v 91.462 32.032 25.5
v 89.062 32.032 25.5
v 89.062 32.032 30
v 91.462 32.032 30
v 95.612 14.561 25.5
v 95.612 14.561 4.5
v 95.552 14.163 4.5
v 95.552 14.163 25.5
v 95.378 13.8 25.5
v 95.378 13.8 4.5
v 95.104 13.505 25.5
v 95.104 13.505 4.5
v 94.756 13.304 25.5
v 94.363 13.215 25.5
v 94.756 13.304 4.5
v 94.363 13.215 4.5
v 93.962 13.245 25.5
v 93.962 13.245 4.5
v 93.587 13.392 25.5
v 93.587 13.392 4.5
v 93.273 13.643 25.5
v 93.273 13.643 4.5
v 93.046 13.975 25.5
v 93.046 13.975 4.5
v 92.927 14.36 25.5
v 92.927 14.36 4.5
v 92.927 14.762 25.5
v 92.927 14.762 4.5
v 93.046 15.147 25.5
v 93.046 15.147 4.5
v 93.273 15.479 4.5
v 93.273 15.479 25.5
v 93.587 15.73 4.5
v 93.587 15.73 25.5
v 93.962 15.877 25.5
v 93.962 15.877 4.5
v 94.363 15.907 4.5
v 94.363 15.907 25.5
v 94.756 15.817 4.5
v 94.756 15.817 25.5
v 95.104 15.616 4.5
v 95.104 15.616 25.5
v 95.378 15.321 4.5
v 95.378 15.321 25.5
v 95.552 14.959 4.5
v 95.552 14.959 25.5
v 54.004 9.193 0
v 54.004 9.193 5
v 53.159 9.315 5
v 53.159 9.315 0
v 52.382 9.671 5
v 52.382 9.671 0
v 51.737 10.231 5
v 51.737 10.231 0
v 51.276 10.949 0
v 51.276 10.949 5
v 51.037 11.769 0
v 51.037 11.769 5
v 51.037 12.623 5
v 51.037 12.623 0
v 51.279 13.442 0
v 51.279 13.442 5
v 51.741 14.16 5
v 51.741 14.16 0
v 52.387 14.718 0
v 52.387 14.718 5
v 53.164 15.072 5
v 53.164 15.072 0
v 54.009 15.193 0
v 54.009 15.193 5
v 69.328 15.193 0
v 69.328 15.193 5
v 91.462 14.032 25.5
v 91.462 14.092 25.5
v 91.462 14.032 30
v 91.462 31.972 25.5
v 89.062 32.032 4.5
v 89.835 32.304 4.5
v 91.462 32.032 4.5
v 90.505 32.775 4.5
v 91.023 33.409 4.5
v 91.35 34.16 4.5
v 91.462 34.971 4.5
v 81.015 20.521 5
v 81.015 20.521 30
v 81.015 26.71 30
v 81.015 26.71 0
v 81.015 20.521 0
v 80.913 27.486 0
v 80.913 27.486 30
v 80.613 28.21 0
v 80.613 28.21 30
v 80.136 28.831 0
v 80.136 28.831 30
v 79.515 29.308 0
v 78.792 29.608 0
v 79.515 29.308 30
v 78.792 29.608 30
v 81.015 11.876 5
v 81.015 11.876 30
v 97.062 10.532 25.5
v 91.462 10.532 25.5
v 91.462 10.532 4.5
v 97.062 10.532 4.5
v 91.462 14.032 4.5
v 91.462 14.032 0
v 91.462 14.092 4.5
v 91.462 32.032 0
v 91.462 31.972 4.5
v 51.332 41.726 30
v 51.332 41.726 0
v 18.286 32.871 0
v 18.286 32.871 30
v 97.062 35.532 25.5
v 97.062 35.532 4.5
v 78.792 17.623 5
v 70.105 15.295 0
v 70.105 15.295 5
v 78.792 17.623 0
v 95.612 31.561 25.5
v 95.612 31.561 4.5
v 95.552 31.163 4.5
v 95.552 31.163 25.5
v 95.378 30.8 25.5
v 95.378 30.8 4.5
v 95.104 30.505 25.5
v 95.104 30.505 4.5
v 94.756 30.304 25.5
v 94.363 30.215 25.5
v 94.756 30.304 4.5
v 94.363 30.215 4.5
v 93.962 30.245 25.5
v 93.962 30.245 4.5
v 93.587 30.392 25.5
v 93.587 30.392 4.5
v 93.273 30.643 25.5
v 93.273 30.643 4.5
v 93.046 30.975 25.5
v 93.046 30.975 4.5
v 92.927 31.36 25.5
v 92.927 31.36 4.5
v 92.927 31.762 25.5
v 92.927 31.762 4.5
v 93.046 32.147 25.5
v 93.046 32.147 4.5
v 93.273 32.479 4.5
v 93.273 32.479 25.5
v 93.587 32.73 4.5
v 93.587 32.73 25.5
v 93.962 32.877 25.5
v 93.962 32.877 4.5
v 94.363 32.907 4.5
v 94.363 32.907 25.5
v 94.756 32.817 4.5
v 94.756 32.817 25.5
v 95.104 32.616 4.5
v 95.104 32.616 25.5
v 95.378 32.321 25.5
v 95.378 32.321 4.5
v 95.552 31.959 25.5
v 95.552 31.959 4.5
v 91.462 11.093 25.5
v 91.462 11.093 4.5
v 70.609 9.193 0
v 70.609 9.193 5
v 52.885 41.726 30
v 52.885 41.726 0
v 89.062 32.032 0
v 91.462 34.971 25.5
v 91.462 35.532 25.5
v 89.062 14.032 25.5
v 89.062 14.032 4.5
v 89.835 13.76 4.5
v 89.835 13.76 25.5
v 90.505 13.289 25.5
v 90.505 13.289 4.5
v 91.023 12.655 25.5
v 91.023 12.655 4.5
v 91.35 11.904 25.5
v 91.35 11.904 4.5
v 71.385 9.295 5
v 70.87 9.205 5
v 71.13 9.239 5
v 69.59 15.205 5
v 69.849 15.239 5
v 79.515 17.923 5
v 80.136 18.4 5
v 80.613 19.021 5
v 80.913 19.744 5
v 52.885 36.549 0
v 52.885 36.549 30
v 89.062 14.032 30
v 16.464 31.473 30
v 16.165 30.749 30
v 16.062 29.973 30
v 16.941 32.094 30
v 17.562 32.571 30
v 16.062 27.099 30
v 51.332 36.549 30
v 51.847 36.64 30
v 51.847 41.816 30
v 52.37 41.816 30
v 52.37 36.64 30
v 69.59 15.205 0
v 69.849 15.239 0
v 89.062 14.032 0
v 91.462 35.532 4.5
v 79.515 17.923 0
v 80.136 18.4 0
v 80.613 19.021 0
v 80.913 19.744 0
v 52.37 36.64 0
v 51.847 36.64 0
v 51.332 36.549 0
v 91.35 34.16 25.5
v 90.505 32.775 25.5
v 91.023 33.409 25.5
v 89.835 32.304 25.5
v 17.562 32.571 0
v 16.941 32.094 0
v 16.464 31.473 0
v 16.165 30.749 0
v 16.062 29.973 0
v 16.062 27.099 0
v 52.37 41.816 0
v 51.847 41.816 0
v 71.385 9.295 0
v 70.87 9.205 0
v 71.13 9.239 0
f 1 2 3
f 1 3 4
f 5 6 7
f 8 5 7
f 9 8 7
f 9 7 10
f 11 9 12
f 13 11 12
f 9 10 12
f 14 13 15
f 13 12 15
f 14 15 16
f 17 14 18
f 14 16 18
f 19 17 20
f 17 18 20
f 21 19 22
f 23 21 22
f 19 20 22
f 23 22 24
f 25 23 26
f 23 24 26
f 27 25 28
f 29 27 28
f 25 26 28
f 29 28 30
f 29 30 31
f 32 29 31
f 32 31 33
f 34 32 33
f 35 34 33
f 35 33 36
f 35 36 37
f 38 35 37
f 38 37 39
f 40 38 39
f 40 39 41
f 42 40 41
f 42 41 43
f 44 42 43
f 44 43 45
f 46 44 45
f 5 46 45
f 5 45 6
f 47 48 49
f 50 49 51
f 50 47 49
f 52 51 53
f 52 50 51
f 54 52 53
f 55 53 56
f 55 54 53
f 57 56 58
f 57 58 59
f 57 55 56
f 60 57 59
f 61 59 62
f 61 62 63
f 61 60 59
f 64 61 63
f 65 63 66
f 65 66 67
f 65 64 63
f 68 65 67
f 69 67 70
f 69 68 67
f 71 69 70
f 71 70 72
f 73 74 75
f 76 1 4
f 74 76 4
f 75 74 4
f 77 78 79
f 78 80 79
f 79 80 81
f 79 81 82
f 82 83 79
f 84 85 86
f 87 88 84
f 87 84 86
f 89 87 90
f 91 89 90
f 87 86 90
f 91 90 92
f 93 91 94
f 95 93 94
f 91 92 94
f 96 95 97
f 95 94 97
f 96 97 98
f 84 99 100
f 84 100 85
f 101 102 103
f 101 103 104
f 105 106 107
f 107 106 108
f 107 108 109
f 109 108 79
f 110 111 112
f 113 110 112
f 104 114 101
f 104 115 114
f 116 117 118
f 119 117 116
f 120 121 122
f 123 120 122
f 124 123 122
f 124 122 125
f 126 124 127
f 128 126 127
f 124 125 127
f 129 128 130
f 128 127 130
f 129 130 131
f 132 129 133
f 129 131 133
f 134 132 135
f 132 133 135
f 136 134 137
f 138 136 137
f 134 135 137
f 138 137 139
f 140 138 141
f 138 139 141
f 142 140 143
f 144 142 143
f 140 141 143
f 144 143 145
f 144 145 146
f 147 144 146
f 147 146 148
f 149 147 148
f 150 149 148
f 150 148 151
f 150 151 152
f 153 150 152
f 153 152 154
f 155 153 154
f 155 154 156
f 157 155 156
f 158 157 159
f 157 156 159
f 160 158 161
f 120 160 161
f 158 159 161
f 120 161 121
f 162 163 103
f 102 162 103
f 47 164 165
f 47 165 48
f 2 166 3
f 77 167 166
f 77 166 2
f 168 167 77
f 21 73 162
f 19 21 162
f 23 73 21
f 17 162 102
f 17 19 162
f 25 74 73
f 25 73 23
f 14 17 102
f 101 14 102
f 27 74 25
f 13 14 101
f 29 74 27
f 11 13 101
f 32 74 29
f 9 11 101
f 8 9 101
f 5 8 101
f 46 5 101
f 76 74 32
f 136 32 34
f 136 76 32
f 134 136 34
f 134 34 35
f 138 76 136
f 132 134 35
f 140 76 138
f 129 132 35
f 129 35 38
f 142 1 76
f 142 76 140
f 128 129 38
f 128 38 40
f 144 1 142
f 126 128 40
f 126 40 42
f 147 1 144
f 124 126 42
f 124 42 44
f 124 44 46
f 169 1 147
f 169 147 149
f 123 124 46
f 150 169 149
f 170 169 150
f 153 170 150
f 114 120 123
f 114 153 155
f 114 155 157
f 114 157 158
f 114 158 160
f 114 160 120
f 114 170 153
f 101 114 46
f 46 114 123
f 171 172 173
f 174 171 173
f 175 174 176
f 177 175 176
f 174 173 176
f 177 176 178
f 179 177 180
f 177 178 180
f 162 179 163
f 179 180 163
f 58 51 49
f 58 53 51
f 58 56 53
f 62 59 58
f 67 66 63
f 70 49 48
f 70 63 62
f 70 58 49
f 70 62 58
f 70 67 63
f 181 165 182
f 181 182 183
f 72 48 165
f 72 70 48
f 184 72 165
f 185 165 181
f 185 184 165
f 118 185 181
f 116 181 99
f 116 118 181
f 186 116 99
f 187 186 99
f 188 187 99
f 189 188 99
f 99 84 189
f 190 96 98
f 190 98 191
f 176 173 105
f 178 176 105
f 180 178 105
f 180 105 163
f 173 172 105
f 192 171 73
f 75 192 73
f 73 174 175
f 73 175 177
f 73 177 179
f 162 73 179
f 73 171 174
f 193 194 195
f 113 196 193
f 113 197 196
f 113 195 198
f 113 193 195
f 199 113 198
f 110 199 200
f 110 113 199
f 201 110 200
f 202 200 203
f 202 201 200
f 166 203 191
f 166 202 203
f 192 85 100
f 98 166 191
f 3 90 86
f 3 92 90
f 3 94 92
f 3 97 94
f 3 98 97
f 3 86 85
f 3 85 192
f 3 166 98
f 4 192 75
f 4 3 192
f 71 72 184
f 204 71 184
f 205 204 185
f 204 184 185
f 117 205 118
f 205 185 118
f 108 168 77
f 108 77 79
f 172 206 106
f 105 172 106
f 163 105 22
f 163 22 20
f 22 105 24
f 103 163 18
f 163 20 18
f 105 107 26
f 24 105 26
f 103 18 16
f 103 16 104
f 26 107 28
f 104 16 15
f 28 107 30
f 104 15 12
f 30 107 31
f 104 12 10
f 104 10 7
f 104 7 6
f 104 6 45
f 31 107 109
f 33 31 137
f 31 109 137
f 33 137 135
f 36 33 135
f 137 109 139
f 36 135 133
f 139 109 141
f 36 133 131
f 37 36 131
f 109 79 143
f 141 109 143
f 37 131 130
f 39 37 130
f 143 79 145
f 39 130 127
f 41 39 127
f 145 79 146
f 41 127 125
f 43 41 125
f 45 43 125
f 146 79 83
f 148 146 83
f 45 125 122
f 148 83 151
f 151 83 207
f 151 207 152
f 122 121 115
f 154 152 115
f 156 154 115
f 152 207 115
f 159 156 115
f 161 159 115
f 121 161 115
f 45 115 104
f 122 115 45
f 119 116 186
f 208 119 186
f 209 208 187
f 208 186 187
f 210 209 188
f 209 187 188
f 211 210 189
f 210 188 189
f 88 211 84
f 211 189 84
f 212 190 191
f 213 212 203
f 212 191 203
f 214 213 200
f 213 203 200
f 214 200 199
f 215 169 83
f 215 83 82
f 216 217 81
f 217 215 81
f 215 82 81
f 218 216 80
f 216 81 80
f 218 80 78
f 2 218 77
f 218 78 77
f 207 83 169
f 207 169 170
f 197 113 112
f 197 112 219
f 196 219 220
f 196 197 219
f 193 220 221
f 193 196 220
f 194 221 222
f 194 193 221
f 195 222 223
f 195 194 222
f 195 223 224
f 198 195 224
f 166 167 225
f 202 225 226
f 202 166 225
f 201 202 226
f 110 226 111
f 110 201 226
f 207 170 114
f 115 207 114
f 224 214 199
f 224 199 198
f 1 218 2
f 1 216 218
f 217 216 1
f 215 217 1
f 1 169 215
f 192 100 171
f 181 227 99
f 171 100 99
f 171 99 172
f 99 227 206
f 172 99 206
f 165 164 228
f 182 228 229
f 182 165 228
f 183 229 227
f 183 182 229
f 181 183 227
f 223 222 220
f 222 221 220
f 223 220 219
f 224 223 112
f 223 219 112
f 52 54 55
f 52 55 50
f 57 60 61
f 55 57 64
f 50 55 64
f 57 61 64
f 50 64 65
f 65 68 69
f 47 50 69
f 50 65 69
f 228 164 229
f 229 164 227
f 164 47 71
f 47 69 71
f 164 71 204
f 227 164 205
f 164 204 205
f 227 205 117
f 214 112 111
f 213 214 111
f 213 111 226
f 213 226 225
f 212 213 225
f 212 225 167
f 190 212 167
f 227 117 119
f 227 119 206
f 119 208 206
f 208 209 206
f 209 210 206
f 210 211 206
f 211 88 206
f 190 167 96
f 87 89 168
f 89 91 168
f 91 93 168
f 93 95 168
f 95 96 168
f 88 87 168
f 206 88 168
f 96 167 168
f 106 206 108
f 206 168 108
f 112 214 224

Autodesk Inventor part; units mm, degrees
ref_plane "YZ Plane" through (0, 0, 0) normal (1, 0, 0) x (0, 1, 0)
ref_plane "XZ Plane" through (0, 0, 0) normal (0, 1, 0) x (-1, 0, 0)
ref_plane "XY Plane" through (0, 0, 0) normal (0, 0, 1) x (1, 0, 0)
sketch "Sketch1" plane through (0, 0, 0) normal (0, 0, 1) x (1, 0, 0)
  line L0 (52.1089, 41.9337) -> (16.0623, 32.275)
  line L1 (81.0151, 18.2189) -> (81.0151, 29.0119)
  line L2 (81.0151, 29.0119) -> (52.1089, 36.7573)
  line L3 (52.1089, 36.7573) -> (16.0623, 27.0986)
  line L4 (16.0623, 32.275) -> (16.0623, 27.0986)
  line L5 (71.0038, 9.1932) -> (89.0623, 14.032)
  line L6 (71.0038, 9.1932) -> (54.0038, 9.1932)
  line L7 (54.0092, 15.1932) -> (69.7233, 15.1932)
  arc A0 (54.0092, 15.1932) -> (54.0038, 9.1932) centre (54.0065, 12.1932) ccw
  line L8 (69.7233, 15.1932) -> (81.0151, 18.2189)
  line L9 (52.1089, 41.9337) -> (89.0623, 32.032)
  line L10 (97.0623, 35.532) -> (97.0623, 10.532)
  circle A1 centre (94.2623, 31.5608) radius 1.35 projected
  circle A2 centre (94.2623, 14.5608) radius 1.35 projected
  line L11 (89.0623, 32.032) -> (91.4623, 32.032)
  line L12 (91.4623, 32.032) -> (91.4623, 35.532)
  line L13 (91.4623, 35.532) -> (97.0623, 35.532)
  line L14 (89.0623, 14.032) -> (91.4623, 14.032)
  line L15 (91.4623, 14.032) -> (91.4623, 10.532)
  line L16 (91.4623, 10.532) -> (97.0623, 10.532)
  point P0 (0, 0)
  dimension "d0" = 5
  dimension "d1" = 6
  dimension "d2" = 5
  dimension "d3" = 75
  dimension "d4" = 150
  dimension "d5" = 18
  dimension "d6" = 15
  dimension "d28" = 25
  dimension "d30" = 5.6
  dimension "d31" = 5.6
extrude "Extrusion1" add sketch "Sketch1" along normal blind 30
fillet "Fillet1" radius 3 7 edges at (81.0151, 29.0119, 15) (81.0151, 18.2189, 15) (69.7233, 15.1932, 15) (52.1089, 36.7573, 15) (52.1089, 41.9337, 15) (16.0623, 32.275, 15) (71.0038, 9.1932, 15)
sketch "Sketch7" plane through (0, 0, 30) normal (0, 0, 1) x (1, 0, 0)
  line L0 (81.0151, 20.5208) -> (47.1738, 20.5208)
  line L1 (47.1738, 20.5208) -> (47.1738, 6.5941)
  line L2 (47.1738, 6.5941) -> (81.0151, 6.5941)
  line L3 (81.0151, 6.5941) -> (81.0151, 20.5208)
  point P0 (0, 0)
extrude "Extrusion6" cut sketch "Sketch7" against normal blind 25
sketch "Sketch6" plane through (91.4623, 35.532, 0) normal (0, 1, 0) x (1, 0, 0)
  line L0 (0, 0) -> (0, -30) projected
  line L1 (5.6, 0) -> (0, 0)
  line L2 (0, 0) -> (0, -4.5)
  line L3 (0, -4.5) -> (5.6, -4.5)
  line L4 (5.6, -4.5) -> (5.6, 0)
  line L5 (5.6, -30) -> (0, -30)
  line L6 (0, -30) -> (0, -25.5)
  line L7 (0, -25.5) -> (5.6, -25.5)
  line L8 (5.6, -25.5) -> (5.6, -30)
  point P0 (-91.4623, 0)
  dimension "d32" = 4.5
  dimension "d33" = 5.6
  dimension "d34" = 4.5
extrude "Extrusion5" cut sketch "Sketch6" against normal through all
fillet "Fillet2" radius 3 2 edges at (91.4623, 14.032, 15) (91.4623, 32.032, 15)
properties part number "Left Hand" material "Aluminum-6061"
